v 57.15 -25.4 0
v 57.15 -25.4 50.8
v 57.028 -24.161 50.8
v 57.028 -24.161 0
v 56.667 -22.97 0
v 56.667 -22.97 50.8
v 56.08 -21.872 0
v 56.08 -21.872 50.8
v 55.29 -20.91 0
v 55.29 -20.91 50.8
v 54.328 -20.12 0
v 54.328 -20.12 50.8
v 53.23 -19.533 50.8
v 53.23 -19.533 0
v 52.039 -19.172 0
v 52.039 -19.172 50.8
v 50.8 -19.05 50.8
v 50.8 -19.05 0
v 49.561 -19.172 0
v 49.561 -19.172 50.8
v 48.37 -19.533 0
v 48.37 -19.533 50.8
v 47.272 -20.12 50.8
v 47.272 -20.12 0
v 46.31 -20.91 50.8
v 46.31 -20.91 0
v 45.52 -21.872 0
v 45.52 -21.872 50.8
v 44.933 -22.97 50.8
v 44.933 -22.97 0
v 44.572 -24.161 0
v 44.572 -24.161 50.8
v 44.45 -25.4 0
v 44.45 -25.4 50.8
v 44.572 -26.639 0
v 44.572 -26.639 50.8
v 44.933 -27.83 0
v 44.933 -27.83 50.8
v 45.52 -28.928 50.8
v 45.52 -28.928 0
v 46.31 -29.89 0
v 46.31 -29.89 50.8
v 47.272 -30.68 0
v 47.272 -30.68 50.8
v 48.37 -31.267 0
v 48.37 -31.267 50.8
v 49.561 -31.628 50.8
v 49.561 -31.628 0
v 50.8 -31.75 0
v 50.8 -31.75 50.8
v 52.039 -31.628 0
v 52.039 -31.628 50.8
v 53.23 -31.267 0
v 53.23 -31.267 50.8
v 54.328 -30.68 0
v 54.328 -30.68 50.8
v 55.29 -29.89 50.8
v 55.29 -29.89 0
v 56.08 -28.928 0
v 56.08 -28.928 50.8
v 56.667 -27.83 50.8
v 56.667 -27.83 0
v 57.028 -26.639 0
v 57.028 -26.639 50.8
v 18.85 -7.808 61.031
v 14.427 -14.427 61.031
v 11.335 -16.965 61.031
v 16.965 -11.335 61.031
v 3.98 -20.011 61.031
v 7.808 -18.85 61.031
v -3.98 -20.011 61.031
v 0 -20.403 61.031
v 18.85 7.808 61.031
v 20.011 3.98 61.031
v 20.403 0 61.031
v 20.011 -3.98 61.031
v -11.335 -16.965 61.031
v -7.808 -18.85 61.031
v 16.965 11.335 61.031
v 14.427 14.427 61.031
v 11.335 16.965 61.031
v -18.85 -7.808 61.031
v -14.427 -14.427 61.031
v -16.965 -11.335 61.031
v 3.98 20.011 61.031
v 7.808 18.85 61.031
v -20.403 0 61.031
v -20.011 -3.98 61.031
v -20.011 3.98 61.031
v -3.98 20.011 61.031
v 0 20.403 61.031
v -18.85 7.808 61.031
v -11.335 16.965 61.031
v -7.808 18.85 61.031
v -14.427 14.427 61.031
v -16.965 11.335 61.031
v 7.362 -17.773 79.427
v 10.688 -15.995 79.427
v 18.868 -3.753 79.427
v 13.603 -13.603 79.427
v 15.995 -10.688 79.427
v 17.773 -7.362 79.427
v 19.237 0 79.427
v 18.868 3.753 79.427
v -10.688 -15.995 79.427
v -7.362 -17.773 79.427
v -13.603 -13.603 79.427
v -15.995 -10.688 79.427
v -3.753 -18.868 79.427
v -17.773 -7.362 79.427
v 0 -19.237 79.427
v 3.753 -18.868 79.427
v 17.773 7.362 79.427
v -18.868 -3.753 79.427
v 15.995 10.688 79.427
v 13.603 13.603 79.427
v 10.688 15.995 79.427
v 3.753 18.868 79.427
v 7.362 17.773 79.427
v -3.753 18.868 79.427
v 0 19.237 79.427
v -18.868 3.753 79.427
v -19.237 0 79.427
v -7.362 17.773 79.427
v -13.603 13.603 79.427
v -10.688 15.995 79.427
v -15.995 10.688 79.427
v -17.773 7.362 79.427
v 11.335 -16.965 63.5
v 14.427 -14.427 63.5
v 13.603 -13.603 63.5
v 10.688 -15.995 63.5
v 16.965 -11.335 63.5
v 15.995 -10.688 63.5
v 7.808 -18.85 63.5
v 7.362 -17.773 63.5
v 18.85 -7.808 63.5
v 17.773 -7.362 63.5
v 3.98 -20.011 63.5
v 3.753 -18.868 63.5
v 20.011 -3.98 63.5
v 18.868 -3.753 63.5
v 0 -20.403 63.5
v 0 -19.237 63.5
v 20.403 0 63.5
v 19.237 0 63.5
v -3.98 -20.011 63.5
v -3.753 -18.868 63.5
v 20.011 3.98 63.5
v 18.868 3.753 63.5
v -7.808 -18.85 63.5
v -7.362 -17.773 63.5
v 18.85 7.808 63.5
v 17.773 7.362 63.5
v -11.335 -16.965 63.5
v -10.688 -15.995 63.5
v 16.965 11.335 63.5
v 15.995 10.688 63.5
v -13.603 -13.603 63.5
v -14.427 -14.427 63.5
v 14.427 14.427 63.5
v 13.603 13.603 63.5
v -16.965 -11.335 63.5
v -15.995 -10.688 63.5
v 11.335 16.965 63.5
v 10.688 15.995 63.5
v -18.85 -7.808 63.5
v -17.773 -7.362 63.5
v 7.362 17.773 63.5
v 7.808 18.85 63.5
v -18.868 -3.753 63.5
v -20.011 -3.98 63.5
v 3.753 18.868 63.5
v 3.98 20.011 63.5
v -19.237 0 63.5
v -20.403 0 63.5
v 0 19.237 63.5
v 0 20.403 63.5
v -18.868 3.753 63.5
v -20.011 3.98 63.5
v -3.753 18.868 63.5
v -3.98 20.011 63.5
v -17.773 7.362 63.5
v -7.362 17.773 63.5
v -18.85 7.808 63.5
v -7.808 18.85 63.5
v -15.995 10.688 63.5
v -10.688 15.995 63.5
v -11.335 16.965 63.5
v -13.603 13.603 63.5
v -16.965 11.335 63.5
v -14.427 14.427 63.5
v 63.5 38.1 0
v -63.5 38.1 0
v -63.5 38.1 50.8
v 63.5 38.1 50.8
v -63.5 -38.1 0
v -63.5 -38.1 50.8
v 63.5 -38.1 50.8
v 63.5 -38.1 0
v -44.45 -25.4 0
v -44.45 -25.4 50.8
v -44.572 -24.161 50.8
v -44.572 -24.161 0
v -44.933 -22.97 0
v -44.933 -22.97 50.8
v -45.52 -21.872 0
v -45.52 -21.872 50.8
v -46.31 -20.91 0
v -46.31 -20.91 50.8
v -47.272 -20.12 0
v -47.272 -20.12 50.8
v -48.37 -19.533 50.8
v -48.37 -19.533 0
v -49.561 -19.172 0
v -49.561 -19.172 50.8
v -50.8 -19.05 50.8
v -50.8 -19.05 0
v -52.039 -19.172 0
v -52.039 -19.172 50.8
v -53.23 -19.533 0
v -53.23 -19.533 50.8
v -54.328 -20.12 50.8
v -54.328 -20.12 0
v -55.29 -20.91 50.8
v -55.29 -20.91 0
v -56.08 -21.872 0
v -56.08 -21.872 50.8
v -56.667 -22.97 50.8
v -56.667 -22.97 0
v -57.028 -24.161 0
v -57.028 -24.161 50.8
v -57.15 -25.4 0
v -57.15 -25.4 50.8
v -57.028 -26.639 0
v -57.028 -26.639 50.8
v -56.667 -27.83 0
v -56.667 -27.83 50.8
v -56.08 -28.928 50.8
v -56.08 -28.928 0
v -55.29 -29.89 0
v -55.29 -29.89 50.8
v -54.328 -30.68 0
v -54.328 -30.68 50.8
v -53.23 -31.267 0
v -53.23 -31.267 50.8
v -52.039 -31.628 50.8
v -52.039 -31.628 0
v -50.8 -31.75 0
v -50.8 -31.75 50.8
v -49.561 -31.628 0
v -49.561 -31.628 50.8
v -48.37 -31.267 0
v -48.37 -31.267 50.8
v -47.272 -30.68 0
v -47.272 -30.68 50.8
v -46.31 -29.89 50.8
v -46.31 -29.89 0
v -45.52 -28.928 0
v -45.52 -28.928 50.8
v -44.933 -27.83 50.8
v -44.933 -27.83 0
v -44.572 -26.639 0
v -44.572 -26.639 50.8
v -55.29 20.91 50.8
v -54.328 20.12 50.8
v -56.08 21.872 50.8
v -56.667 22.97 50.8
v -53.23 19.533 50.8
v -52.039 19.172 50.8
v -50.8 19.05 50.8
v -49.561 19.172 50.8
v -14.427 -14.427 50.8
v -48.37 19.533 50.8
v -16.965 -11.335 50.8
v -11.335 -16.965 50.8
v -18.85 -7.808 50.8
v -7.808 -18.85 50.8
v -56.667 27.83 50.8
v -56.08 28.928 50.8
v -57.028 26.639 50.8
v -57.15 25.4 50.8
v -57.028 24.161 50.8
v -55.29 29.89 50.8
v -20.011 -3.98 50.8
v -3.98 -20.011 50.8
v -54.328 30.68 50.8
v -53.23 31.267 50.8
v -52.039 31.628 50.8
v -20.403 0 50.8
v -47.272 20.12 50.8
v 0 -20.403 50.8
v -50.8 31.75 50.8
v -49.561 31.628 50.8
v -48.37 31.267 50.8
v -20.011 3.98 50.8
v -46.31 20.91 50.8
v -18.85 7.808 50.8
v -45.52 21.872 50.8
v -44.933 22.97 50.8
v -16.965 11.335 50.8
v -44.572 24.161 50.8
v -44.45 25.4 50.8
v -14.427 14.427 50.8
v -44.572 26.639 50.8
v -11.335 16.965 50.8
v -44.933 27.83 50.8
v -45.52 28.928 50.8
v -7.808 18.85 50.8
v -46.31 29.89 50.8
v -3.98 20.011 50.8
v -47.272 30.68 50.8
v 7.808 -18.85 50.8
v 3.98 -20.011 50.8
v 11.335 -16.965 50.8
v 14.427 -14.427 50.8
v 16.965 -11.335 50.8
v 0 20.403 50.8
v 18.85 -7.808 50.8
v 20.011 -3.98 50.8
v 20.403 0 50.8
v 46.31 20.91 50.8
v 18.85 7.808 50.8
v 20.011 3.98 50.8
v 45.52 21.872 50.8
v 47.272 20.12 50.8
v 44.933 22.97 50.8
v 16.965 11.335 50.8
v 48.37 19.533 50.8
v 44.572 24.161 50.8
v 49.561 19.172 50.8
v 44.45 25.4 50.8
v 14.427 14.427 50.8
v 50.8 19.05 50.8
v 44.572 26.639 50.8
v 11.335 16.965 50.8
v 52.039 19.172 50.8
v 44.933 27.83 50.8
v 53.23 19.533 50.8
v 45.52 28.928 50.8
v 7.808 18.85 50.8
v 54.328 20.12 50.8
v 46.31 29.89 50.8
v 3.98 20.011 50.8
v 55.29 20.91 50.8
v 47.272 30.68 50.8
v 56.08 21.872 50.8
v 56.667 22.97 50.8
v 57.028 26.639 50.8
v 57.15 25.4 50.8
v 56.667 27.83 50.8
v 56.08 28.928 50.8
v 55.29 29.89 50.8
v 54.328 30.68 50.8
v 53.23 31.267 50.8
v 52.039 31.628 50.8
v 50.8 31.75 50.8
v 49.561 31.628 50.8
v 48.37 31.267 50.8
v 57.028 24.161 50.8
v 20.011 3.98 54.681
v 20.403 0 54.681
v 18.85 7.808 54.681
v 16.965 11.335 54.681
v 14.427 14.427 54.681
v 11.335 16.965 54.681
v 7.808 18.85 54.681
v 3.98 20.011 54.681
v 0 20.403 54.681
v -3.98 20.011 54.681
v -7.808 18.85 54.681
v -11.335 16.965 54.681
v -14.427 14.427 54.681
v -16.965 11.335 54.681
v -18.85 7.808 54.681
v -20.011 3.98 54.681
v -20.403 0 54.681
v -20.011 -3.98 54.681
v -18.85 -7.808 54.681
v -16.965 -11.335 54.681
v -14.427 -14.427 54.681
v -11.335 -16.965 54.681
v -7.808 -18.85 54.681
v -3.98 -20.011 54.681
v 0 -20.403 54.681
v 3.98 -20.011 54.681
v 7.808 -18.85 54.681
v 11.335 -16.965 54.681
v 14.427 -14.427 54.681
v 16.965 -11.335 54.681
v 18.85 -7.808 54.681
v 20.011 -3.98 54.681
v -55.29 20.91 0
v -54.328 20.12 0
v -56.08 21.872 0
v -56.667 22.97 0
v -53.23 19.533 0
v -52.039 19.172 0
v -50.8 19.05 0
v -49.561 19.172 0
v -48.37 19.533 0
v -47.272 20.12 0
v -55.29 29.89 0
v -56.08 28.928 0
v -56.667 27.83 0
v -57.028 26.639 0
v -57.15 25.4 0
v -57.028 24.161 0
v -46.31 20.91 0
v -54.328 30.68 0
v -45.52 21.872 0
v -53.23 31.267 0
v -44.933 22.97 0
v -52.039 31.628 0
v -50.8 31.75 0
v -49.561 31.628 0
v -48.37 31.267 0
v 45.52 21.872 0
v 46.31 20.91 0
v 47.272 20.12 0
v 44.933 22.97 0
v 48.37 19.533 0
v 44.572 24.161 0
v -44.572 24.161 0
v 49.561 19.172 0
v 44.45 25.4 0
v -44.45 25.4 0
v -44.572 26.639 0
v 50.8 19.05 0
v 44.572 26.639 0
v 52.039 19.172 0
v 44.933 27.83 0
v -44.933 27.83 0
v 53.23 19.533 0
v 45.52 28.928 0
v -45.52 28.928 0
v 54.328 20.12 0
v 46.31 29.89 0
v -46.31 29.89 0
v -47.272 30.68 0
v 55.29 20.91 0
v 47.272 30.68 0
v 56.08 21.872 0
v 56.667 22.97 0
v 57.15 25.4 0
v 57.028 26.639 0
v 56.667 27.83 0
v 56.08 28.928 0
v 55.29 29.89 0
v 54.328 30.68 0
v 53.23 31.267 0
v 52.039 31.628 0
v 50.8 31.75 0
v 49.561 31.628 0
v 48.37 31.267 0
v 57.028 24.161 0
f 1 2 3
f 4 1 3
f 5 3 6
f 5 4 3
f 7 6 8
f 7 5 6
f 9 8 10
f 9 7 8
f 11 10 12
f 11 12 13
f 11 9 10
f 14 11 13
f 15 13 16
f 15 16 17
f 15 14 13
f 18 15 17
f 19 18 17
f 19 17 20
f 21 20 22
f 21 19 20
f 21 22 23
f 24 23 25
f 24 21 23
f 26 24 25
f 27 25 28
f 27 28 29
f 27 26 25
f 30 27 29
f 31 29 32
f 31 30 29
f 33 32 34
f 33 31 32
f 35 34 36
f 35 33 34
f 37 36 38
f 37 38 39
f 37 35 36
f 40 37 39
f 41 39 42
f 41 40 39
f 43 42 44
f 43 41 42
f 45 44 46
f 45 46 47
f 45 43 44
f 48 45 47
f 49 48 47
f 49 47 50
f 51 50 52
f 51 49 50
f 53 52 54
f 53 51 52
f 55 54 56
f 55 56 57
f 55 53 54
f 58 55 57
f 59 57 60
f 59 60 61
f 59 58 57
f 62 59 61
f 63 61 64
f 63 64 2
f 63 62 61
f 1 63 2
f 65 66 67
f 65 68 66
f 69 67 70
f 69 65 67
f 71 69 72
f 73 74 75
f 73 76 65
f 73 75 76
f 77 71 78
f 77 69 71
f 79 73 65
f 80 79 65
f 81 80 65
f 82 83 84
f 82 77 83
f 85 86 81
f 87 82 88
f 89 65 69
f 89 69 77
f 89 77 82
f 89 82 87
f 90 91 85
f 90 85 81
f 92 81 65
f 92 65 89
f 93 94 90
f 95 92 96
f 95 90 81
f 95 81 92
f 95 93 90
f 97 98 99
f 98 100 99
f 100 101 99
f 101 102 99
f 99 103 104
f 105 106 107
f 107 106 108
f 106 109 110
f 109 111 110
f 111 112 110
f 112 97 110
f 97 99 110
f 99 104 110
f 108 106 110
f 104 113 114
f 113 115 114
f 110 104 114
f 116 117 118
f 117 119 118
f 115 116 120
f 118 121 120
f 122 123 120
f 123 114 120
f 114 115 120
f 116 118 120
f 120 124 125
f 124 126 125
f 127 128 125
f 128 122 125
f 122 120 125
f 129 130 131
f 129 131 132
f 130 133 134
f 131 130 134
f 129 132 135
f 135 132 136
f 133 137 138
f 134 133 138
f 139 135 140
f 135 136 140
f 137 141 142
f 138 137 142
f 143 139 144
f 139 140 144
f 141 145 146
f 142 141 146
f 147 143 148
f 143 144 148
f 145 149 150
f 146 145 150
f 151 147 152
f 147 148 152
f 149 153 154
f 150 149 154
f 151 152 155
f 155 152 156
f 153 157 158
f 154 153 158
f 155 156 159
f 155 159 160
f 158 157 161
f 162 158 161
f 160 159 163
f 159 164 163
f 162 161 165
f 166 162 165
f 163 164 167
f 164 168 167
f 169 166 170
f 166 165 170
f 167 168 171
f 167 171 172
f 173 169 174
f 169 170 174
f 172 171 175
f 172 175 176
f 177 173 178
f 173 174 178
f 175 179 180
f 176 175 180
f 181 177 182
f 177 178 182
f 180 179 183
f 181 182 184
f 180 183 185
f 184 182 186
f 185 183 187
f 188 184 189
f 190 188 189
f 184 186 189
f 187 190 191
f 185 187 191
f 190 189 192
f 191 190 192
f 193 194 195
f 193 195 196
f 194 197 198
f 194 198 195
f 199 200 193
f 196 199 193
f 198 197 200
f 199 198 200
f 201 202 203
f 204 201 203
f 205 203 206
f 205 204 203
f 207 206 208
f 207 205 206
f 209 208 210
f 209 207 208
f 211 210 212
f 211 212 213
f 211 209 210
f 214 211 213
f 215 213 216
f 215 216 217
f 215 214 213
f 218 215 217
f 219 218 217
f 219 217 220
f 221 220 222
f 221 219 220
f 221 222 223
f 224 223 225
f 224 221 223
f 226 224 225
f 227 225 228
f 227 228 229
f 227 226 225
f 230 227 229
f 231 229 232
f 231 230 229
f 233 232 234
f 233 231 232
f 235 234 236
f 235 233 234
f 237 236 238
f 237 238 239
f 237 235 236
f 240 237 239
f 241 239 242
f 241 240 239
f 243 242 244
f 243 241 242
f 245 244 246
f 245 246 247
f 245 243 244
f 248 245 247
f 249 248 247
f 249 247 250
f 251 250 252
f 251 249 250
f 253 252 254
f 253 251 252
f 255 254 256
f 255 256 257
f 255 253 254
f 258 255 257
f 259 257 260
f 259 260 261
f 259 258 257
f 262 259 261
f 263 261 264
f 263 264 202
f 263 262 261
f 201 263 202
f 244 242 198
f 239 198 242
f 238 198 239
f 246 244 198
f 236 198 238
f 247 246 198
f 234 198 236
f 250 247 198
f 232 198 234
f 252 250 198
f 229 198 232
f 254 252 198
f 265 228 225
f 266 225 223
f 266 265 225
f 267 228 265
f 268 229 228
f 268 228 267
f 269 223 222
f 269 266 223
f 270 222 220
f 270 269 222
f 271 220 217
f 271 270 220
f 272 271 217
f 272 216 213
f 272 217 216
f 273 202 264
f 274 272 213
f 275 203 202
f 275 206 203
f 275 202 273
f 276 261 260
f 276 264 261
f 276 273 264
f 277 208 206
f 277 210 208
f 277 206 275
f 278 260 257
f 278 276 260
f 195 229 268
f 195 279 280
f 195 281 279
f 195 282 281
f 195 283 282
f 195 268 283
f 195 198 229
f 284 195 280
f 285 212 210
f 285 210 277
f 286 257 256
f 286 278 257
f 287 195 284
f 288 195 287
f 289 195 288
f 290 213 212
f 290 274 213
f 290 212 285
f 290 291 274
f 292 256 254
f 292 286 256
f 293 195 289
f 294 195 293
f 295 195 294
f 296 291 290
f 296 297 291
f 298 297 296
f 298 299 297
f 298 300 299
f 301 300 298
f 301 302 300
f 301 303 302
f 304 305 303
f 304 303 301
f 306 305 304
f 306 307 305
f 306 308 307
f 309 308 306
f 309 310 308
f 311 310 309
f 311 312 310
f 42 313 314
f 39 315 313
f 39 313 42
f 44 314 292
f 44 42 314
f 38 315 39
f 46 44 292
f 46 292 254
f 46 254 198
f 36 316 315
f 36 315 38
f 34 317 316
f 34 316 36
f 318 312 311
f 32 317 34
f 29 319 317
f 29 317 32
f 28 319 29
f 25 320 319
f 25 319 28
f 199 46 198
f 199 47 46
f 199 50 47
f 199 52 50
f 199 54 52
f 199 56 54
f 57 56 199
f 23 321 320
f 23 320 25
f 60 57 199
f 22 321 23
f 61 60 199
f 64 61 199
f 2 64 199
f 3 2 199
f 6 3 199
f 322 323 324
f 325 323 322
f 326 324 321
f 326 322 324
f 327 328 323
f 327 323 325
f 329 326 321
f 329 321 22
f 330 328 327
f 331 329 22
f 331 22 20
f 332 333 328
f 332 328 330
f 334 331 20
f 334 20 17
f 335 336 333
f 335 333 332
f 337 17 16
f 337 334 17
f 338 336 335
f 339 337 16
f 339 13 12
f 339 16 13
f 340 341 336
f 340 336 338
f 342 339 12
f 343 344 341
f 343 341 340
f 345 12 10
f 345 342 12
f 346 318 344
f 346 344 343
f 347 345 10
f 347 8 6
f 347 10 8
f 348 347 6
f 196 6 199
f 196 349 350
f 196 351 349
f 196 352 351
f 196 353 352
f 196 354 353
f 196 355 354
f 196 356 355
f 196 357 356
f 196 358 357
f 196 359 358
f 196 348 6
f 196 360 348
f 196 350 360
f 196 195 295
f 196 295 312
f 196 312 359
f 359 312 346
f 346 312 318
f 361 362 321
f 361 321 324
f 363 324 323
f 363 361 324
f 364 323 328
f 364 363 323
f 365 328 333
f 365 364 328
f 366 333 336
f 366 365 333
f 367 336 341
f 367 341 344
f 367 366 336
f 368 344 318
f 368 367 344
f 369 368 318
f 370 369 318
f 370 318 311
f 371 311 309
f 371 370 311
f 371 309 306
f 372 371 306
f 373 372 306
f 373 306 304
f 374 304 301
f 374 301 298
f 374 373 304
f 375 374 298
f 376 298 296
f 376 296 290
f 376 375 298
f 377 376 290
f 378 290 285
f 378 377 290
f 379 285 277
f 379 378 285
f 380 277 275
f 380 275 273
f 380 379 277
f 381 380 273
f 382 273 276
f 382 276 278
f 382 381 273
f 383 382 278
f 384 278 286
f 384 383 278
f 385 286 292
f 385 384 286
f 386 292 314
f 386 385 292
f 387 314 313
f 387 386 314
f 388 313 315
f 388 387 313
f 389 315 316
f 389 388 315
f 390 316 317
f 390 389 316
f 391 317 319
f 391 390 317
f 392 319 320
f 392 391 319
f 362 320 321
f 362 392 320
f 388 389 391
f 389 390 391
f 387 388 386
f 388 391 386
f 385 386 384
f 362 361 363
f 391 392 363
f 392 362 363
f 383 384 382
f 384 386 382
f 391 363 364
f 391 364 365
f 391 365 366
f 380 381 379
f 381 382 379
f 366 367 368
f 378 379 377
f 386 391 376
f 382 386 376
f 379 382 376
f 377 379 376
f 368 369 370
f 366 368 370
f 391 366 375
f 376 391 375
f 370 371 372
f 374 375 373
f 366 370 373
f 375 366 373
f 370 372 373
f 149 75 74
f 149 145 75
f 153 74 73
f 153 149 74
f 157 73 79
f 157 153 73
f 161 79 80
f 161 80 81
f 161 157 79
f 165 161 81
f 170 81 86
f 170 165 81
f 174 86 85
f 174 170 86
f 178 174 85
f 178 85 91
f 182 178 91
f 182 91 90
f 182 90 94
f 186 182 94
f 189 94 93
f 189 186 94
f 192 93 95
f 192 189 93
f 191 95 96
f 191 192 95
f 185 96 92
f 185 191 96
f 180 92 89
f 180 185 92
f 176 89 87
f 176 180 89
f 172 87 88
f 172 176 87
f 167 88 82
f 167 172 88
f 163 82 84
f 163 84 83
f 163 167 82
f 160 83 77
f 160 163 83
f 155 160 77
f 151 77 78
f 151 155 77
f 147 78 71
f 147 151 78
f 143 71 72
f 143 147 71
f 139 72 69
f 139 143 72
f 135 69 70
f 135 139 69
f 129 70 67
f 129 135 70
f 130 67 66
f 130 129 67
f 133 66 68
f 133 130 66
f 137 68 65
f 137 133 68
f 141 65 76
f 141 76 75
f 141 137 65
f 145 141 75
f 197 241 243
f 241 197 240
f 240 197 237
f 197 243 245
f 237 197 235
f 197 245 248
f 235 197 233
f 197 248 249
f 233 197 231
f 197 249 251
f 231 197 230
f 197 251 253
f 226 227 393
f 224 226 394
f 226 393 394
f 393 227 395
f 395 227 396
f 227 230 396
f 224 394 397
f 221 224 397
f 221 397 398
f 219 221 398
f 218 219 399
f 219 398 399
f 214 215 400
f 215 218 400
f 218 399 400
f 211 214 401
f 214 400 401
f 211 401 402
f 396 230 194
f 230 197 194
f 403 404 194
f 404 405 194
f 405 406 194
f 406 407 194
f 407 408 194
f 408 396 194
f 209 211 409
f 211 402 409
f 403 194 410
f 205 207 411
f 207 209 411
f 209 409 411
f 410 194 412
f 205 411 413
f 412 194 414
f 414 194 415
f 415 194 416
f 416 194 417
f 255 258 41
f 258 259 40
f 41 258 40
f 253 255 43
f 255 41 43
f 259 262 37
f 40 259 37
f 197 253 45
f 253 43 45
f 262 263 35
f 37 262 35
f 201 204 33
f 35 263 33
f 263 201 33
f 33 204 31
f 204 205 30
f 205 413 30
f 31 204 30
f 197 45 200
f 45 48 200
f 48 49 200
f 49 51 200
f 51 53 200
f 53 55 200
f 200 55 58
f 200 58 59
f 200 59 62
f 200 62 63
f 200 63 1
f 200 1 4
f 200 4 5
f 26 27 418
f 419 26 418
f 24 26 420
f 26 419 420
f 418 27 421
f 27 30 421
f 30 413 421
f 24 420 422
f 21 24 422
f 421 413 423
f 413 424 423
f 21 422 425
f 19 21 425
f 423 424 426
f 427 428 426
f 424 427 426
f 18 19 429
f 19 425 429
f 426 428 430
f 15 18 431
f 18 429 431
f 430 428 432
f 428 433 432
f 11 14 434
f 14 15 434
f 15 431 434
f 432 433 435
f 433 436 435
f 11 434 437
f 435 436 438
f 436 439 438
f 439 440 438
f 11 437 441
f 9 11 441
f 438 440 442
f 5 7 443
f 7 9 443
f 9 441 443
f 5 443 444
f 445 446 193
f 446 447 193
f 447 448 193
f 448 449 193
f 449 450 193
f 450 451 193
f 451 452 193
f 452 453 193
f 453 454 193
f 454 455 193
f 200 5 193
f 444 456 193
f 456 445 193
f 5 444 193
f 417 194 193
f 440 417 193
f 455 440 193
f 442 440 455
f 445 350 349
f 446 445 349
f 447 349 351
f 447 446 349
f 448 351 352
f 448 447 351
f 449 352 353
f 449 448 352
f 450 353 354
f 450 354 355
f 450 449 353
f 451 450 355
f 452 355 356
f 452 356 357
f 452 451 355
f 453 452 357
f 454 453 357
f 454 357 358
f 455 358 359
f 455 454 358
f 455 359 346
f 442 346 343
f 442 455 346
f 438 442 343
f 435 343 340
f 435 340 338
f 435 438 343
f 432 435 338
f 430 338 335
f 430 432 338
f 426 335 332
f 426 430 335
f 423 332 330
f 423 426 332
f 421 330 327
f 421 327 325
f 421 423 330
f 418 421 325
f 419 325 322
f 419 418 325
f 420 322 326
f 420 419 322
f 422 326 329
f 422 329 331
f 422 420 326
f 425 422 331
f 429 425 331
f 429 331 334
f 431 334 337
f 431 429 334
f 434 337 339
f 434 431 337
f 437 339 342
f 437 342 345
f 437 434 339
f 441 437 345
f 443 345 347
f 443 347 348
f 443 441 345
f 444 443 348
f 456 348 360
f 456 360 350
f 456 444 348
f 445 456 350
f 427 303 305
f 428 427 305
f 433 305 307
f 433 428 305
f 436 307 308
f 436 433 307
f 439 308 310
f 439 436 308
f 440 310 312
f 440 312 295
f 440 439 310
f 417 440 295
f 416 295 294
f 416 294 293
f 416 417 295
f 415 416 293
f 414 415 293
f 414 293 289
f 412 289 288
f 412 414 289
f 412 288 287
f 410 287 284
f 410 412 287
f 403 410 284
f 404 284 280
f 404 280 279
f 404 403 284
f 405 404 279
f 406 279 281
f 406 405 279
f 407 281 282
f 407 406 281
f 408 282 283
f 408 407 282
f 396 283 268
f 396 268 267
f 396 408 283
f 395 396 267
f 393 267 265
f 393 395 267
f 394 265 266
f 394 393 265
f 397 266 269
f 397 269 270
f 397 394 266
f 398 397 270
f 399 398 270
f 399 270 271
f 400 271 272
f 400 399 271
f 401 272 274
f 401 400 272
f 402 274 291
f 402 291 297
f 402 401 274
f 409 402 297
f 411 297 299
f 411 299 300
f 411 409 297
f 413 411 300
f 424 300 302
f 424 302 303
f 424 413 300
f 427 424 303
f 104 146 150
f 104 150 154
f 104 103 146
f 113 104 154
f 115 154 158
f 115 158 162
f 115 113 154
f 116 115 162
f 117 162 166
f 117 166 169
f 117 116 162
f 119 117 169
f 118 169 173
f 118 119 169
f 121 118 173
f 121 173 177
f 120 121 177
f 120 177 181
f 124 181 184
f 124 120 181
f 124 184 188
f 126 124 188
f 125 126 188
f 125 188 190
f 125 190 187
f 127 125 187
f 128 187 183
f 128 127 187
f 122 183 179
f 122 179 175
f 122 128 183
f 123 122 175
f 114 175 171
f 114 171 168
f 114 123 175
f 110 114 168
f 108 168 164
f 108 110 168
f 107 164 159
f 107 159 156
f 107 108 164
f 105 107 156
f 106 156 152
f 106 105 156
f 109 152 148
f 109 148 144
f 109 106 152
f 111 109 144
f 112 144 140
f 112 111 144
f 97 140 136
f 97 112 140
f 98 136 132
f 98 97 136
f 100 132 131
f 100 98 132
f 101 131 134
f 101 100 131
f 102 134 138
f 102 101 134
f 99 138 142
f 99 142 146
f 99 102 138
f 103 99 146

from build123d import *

# Parameters (mm, degrees)
F0_W     = 127
F0_H     = 76.2
F0_R     = 6.35
F1_DEPTH = 50.8
F2_W     = 20.4032771289
F2_H     = 12.7
F4_W     = 19.2373767495
F4_H     = 15.927048564
F6_W     = 38.1
F6_H     = 6.35


with BuildPart() as f1:
    # F0 (on Top) → F1 (new body)
    with BuildSketch(Plane.XY):
        Rectangle(F0_W, F0_H)
        with Locations((-50.8, -25.4)):
            Circle(F0_R, mode=Mode.SUBTRACT)
        with Locations((50.8, -25.4)):
            Circle(F0_R, mode=Mode.SUBTRACT)
        with Locations((-50.8, 25.4)):
            Circle(F0_R, mode=Mode.SUBTRACT)
        with Locations((50.8, 25.4)):
            Circle(F0_R, mode=Mode.SUBTRACT)
    extrude(amount=F1_DEPTH)

    # F2 (on Front) → F3 (revolve)
    with BuildSketch(Plane.XZ):
        with Locations((10.2016385645, 57.15)):
            Rectangle(F2_W, F2_H)
    revolve(axis=Axis((0, 0, 57.15), (0, 0, 1)))

    # F4 (on Front) → F5 (revolve)
    with BuildSketch(Plane.XZ):
        with Locations((9.6186883748, 71.463524282)):
            Rectangle(F4_W, F4_H)
    revolve(axis=Axis((0, 0, 71.463524282), (0, 0, 1)))

    # F6 (on Front) → F7 (revolve, cut)
    with BuildSketch(Plane.XZ):
        with Locations((19.05, 57.8555281689)):
            Rectangle(F6_W, F6_H)
    revolve(axis=Axis((0, 0, 57.8555281689), (0, 0, 1)), mode=Mode.SUBTRACT)


solid = f1.part
